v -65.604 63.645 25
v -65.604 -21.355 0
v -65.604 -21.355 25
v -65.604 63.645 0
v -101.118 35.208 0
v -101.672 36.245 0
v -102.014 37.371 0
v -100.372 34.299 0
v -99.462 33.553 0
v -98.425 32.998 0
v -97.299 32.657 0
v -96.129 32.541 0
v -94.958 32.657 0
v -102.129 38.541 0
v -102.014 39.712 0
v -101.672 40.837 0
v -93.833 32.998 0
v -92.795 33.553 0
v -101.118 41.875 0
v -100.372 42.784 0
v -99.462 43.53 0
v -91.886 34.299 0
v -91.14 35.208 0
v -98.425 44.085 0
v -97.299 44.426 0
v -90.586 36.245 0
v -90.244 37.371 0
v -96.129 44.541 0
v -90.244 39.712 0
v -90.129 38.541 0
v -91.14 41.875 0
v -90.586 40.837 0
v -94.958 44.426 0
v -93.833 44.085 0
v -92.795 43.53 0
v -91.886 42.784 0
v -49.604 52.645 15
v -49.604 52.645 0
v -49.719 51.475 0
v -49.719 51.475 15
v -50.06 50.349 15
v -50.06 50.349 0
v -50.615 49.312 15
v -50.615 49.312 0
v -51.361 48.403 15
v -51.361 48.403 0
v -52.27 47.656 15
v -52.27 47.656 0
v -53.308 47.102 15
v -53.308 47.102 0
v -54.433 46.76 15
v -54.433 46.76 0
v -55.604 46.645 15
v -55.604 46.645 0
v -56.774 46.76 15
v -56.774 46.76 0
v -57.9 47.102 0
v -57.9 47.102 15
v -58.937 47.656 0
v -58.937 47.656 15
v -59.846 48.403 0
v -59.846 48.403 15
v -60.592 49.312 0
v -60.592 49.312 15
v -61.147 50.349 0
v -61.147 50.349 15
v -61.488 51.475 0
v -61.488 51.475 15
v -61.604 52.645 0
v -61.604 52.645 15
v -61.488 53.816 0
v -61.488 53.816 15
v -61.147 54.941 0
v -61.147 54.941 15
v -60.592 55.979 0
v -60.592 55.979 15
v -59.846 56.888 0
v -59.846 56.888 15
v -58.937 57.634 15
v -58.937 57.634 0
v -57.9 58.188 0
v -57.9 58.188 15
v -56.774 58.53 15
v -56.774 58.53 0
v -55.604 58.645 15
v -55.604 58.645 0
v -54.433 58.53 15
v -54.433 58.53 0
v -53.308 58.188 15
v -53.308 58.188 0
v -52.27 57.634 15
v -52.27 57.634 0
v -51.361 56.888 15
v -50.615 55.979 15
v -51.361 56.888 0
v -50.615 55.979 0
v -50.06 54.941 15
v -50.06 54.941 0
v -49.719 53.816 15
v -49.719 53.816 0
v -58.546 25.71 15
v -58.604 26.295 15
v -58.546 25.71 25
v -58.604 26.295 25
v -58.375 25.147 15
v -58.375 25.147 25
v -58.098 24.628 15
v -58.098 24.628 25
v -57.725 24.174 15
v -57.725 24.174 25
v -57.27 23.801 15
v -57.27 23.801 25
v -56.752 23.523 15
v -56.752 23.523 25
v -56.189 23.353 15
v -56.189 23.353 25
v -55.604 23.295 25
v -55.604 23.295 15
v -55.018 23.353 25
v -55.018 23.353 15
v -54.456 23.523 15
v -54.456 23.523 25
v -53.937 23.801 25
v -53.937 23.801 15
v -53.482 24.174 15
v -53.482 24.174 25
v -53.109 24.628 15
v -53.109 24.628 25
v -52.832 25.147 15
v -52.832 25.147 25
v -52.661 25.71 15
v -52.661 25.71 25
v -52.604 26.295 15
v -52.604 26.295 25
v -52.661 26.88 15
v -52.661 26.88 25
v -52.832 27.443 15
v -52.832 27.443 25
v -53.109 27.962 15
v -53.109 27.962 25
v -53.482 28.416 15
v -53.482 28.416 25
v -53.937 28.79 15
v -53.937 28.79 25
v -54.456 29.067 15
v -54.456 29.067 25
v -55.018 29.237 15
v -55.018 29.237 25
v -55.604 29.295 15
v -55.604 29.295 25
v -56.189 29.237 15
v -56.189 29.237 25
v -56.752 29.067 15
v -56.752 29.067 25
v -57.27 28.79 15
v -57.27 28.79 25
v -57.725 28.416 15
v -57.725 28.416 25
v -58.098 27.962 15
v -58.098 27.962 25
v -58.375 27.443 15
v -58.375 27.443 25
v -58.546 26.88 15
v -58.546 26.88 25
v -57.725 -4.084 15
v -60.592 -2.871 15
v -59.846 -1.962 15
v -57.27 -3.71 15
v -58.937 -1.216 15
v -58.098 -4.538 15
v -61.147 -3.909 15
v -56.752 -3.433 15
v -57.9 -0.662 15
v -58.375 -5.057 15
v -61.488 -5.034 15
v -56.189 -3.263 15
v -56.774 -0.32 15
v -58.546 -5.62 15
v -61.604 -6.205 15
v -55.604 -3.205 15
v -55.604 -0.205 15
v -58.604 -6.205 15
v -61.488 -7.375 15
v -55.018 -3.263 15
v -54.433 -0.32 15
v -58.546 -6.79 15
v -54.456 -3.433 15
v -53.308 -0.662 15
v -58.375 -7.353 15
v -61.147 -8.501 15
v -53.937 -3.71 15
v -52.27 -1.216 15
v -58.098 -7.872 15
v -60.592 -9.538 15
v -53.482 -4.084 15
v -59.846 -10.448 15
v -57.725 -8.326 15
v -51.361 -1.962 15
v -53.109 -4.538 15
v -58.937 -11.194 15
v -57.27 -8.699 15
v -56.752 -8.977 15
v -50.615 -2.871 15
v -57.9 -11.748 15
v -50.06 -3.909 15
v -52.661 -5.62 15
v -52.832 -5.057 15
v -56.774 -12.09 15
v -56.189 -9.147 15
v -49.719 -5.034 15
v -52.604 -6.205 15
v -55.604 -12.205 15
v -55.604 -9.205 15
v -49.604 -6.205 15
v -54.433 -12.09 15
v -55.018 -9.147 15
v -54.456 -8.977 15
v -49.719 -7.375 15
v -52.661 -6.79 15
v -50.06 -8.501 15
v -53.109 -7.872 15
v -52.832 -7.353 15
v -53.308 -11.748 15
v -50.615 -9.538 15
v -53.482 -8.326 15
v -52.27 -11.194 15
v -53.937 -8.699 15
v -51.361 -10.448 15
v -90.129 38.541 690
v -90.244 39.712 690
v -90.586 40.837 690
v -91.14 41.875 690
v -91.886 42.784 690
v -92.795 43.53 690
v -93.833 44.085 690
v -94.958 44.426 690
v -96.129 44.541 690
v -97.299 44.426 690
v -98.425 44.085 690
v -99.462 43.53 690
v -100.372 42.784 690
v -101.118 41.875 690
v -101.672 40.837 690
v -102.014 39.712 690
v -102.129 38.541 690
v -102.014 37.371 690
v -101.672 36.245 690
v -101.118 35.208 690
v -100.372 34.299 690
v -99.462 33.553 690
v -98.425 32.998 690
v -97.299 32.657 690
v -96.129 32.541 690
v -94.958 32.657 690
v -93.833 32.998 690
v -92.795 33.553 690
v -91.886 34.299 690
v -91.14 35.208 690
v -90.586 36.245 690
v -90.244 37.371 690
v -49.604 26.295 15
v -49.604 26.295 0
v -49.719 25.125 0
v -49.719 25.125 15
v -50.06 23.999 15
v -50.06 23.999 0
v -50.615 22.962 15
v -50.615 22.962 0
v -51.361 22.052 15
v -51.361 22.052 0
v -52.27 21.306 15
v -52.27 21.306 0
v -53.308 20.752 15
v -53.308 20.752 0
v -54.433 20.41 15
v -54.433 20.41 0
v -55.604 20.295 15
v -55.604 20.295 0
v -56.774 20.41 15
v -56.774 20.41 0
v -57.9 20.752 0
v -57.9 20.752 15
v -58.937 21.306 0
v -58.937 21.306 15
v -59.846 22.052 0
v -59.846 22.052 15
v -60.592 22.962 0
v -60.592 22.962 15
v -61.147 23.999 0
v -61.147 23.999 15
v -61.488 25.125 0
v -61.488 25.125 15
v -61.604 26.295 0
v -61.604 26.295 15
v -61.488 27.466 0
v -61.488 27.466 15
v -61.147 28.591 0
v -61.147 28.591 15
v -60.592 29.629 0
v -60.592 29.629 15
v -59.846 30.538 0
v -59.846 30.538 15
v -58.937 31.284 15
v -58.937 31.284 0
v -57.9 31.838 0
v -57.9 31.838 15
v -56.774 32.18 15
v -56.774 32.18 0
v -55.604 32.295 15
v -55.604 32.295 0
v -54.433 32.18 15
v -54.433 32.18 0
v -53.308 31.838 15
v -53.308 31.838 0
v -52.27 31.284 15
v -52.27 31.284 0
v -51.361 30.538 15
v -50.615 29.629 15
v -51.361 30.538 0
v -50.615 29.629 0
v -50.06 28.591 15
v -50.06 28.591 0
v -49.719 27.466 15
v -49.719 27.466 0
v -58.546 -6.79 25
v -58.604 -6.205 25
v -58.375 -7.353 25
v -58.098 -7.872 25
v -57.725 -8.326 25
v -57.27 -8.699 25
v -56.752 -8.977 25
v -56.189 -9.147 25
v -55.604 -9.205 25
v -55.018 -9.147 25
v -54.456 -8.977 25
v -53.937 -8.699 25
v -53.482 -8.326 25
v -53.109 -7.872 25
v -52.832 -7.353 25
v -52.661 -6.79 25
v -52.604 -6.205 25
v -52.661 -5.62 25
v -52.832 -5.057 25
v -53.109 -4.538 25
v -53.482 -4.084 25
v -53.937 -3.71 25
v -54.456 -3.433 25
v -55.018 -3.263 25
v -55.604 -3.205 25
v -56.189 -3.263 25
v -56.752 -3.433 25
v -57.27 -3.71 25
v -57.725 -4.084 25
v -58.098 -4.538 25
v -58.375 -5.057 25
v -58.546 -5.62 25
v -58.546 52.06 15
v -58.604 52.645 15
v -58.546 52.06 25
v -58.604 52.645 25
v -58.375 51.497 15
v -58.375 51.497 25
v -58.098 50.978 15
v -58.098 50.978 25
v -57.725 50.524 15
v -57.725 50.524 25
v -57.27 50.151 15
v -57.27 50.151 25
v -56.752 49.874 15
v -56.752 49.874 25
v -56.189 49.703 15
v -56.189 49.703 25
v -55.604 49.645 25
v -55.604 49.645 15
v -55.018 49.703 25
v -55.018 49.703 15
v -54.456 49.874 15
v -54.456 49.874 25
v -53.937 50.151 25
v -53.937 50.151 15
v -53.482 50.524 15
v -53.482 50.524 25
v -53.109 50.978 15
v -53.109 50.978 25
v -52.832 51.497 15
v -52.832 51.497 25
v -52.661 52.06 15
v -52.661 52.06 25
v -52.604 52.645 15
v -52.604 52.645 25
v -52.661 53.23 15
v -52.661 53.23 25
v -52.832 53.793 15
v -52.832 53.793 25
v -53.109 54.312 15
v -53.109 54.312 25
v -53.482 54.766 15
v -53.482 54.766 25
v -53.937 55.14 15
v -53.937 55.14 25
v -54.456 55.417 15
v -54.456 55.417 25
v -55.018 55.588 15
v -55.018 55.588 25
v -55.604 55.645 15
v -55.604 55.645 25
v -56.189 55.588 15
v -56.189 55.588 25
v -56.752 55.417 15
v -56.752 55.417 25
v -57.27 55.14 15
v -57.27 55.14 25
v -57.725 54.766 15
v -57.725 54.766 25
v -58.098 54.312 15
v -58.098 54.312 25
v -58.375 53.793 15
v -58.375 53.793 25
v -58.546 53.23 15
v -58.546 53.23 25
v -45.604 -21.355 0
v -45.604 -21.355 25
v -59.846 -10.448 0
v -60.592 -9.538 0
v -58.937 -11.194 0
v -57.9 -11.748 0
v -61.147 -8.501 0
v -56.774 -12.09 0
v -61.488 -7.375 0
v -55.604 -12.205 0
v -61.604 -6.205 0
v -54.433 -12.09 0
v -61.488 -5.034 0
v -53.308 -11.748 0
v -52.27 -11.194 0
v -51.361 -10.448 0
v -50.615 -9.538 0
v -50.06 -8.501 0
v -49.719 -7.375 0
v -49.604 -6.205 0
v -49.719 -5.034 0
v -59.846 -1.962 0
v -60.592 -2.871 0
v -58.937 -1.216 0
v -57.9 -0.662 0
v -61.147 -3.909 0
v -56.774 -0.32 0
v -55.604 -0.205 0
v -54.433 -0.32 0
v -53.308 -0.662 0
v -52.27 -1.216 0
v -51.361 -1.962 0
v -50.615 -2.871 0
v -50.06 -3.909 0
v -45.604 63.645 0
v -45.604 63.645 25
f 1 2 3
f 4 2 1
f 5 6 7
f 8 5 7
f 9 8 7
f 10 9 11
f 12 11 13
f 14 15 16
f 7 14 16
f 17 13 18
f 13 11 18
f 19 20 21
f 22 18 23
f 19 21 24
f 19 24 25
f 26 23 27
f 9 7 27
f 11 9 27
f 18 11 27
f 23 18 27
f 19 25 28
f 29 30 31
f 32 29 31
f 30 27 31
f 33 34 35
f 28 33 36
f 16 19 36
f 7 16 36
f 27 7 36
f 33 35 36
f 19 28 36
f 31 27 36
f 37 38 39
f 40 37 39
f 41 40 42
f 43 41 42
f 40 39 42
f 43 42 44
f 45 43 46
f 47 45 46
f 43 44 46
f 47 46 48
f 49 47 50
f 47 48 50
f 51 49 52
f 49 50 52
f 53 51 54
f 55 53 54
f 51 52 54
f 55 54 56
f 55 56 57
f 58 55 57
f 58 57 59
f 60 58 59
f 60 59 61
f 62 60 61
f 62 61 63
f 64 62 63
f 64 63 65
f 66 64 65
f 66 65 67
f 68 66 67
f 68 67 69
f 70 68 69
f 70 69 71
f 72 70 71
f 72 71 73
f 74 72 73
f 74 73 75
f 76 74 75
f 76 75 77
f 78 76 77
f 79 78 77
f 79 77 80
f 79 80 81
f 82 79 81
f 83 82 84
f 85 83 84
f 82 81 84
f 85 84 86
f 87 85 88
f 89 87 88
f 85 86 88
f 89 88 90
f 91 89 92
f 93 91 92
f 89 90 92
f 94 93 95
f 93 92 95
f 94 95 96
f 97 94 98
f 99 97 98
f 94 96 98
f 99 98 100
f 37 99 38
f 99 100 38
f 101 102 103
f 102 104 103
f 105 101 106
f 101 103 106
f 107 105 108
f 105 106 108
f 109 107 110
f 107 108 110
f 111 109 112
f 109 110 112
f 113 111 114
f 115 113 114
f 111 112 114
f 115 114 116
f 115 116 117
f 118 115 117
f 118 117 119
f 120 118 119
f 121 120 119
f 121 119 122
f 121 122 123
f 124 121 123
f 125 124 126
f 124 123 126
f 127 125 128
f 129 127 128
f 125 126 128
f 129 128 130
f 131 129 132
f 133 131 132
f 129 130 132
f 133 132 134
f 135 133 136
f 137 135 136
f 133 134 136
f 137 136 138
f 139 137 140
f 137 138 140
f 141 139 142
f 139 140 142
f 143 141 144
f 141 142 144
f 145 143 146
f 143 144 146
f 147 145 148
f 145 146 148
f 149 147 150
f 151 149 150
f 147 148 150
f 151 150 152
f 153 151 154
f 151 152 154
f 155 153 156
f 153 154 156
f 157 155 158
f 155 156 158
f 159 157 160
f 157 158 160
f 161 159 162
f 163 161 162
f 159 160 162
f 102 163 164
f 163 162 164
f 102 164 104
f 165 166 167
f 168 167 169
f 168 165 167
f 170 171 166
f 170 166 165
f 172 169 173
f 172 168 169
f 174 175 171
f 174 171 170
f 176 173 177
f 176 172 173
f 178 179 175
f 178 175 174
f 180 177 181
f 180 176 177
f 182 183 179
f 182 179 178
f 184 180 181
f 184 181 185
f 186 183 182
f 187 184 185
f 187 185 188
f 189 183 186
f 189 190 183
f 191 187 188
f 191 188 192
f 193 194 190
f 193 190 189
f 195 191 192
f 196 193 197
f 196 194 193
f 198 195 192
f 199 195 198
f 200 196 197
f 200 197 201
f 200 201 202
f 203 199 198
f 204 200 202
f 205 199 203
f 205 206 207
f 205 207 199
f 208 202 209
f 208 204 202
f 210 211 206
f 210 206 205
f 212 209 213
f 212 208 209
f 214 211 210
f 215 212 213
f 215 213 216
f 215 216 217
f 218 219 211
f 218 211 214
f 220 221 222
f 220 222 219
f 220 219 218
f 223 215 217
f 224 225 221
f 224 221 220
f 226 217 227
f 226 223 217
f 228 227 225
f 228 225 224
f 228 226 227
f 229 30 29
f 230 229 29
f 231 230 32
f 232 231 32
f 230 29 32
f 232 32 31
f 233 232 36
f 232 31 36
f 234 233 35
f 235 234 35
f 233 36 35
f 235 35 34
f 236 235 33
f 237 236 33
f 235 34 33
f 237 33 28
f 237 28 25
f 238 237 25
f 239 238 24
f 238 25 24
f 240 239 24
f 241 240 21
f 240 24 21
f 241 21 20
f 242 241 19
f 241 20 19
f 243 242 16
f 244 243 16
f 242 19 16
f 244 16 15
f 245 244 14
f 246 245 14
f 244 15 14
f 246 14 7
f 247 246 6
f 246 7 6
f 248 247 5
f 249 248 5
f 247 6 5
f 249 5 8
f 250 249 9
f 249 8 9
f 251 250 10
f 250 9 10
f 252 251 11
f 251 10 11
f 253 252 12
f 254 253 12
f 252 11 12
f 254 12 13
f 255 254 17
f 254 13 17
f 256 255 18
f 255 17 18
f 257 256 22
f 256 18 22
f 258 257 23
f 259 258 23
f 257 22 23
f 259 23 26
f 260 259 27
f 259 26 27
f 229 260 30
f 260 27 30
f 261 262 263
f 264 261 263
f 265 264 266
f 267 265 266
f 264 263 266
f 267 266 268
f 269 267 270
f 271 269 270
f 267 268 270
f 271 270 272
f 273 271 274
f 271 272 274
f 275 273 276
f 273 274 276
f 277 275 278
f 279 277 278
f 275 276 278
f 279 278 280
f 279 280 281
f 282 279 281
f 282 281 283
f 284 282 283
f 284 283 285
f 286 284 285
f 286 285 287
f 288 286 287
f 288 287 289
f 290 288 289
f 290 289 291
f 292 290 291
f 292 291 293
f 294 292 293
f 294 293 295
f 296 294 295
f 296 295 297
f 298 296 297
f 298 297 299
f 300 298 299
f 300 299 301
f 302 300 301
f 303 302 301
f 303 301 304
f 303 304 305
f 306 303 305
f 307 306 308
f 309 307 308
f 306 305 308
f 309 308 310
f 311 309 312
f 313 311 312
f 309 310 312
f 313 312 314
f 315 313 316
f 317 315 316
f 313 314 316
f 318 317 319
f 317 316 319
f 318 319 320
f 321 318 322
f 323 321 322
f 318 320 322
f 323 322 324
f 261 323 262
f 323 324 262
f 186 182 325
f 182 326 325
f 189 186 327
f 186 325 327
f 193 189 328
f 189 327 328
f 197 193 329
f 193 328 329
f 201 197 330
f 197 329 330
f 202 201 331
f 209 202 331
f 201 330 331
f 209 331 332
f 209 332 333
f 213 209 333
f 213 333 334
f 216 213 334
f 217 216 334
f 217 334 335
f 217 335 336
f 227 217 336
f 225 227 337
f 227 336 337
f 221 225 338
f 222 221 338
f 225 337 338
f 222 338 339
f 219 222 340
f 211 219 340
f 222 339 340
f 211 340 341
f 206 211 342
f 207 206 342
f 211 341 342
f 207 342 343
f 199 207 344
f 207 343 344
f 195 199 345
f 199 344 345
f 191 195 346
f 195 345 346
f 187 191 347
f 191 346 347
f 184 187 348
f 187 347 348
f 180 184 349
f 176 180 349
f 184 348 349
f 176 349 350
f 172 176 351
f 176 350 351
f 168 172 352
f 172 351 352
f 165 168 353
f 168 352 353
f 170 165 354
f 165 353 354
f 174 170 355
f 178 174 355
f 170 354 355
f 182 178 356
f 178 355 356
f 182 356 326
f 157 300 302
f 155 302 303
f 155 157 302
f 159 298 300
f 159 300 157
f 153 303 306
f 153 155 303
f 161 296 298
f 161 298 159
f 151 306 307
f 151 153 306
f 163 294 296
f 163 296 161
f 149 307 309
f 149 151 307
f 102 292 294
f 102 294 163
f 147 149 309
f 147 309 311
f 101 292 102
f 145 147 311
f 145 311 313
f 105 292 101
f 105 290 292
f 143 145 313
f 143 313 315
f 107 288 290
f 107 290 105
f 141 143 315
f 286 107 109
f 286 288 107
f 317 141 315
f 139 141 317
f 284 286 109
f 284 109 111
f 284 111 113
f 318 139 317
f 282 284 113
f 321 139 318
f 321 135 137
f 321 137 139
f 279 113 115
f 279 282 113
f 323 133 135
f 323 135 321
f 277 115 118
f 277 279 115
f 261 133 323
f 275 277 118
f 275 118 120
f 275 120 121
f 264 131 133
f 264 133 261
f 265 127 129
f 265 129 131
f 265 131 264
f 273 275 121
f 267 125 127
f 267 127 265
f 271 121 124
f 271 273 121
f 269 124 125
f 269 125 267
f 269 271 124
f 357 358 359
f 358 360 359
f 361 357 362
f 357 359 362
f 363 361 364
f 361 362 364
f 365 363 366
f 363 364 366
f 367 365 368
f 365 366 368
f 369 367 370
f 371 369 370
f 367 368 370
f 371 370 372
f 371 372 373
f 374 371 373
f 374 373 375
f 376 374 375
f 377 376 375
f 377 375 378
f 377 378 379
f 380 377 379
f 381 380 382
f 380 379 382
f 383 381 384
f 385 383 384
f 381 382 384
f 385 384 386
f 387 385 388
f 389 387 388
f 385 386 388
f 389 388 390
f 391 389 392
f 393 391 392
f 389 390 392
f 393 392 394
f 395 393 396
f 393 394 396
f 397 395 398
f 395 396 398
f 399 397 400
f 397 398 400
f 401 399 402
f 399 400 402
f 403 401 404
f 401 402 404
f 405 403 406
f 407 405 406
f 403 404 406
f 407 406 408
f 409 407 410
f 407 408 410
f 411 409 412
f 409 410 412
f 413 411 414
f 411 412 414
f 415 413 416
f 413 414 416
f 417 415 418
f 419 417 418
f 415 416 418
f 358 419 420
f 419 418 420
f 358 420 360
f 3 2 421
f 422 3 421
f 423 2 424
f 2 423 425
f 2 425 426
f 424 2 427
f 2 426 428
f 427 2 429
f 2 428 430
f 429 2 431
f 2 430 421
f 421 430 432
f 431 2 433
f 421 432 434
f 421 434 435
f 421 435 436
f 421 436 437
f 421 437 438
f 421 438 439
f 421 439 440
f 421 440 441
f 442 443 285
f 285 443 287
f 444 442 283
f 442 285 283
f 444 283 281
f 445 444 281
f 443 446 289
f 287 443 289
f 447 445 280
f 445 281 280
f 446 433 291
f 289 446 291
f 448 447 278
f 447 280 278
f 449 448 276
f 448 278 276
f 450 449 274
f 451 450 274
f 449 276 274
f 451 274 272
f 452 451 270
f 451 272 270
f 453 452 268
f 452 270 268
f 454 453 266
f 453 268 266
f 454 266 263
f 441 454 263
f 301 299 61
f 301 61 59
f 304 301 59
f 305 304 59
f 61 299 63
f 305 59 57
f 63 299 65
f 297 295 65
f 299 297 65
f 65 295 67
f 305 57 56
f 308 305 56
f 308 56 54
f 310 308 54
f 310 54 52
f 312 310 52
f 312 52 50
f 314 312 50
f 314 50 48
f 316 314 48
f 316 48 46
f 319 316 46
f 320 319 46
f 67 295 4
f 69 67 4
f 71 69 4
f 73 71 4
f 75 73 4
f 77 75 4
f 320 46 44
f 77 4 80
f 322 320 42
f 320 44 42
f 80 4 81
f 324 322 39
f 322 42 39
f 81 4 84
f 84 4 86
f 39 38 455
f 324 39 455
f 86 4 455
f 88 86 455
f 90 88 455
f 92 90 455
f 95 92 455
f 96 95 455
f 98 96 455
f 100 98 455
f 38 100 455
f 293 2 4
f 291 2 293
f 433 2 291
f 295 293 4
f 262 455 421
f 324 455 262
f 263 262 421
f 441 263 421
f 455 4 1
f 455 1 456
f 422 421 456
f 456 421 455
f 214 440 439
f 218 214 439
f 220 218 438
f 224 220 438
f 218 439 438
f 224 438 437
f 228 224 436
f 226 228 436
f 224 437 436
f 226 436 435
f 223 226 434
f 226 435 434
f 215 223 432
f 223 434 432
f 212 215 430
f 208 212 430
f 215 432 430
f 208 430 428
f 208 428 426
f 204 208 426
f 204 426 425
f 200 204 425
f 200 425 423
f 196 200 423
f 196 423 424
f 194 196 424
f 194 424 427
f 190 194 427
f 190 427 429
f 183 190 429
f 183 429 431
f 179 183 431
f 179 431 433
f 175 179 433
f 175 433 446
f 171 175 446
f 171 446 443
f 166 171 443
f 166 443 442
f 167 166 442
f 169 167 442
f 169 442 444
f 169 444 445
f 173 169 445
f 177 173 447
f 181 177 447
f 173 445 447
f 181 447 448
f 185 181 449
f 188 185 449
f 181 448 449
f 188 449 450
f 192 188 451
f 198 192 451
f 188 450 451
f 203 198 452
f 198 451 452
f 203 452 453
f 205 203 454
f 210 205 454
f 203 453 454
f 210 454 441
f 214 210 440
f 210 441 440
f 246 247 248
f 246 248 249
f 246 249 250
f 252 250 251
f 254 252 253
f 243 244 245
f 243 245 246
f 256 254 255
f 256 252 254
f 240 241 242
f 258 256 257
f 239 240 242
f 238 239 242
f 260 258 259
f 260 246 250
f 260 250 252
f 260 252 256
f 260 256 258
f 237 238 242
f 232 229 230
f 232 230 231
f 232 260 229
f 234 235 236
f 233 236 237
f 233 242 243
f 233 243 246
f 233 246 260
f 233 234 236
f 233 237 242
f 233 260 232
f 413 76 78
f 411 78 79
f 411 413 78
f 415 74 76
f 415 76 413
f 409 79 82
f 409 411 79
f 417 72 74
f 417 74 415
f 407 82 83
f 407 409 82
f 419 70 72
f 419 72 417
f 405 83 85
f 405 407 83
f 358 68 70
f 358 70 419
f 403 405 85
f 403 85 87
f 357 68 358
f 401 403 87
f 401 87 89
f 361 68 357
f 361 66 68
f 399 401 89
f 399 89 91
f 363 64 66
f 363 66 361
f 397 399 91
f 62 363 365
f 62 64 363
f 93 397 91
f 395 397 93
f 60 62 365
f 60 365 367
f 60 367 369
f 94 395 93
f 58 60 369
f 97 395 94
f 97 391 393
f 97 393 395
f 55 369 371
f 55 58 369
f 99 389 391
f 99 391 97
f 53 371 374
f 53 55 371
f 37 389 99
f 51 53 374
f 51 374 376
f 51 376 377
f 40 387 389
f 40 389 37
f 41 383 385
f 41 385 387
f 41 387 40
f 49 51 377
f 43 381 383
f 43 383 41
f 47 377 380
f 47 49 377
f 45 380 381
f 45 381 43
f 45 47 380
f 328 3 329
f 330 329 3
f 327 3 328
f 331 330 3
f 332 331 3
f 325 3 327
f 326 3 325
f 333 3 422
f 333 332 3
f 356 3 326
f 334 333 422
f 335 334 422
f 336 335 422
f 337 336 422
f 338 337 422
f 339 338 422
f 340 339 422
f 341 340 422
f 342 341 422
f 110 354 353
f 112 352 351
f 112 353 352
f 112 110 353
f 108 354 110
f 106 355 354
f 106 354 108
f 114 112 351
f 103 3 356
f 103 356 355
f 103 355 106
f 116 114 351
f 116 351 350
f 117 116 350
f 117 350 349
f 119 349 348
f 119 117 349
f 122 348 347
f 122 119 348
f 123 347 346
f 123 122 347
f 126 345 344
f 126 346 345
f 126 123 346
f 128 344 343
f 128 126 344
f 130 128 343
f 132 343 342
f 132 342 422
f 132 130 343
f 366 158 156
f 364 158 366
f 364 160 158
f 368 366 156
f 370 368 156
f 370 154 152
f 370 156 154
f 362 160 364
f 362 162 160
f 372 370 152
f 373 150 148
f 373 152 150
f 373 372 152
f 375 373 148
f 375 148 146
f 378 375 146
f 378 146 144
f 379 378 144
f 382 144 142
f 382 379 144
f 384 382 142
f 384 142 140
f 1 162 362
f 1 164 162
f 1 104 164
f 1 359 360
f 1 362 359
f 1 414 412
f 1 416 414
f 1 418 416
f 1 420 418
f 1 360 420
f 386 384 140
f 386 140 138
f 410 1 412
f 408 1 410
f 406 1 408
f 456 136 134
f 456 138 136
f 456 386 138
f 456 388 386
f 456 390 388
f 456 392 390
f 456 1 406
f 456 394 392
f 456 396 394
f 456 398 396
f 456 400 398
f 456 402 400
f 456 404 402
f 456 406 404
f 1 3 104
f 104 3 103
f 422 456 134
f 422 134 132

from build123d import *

# Parameters (mm, degrees)
F0_R           = 6
F1_DEPTH       = 690
F2_W           = 20
F2_H           = 85
F2_R           = 2.5
F2_R_2         = 6
F3_DEPTH       = 25
F4_D           = 6
F4_CBORE_D     = 12
F4_CBORE_DEPTH = 15


with BuildPart() as f1:
    # F0 (on Top) → F1 (new body)
    with BuildSketch(Plane.XY):
        with Locations((-96.1288660765, 38.541328162)):
            Circle(F0_R)
    extrude(amount=F1_DEPTH)


with BuildPart() as f3:
    # F2 (on Top) → F3 (new body)
    with BuildSketch(Plane.XY):
        with Locations((-55.6036287546, 21.1451533437)):
            Rectangle(F2_W, F2_H)
        with Locations((-55.6036287546, -6.2048761174)):
            Circle(F2_R, mode=Mode.SUBTRACT)
        with Locations((-55.6036287546, 26.2951238826)):
            Circle(F2_R, mode=Mode.SUBTRACT)
        with Locations((-55.6036287546, 52.6451533437)):
            Circle(F2_R_2, mode=Mode.SUBTRACT)
        with Locations((-55.6036287546, -6.2048761174)):
            Circle(F2_R)
        with Locations((-55.6036287546, 26.2951238826)):
            Circle(F2_R)
        with Locations((-55.6036287546, 52.6451533437)):
            Circle(F2_R_2)
    extrude(amount=F3_DEPTH)

    # F4 (through all)
    with Locations(Plane(origin=(0, 0, 0), x_dir=(1, 0, 0), z_dir=(0, 0, -1))):
        with Locations((-55.6036287546, -26.2951238826), (-55.6036287546, 6.2048761174), (-55.6036287546, -52.6451533437)):
            CounterBoreHole(F4_D / 2, F4_CBORE_D / 2, F4_CBORE_DEPTH)


solid = Compound([f1.part, f3.part])
